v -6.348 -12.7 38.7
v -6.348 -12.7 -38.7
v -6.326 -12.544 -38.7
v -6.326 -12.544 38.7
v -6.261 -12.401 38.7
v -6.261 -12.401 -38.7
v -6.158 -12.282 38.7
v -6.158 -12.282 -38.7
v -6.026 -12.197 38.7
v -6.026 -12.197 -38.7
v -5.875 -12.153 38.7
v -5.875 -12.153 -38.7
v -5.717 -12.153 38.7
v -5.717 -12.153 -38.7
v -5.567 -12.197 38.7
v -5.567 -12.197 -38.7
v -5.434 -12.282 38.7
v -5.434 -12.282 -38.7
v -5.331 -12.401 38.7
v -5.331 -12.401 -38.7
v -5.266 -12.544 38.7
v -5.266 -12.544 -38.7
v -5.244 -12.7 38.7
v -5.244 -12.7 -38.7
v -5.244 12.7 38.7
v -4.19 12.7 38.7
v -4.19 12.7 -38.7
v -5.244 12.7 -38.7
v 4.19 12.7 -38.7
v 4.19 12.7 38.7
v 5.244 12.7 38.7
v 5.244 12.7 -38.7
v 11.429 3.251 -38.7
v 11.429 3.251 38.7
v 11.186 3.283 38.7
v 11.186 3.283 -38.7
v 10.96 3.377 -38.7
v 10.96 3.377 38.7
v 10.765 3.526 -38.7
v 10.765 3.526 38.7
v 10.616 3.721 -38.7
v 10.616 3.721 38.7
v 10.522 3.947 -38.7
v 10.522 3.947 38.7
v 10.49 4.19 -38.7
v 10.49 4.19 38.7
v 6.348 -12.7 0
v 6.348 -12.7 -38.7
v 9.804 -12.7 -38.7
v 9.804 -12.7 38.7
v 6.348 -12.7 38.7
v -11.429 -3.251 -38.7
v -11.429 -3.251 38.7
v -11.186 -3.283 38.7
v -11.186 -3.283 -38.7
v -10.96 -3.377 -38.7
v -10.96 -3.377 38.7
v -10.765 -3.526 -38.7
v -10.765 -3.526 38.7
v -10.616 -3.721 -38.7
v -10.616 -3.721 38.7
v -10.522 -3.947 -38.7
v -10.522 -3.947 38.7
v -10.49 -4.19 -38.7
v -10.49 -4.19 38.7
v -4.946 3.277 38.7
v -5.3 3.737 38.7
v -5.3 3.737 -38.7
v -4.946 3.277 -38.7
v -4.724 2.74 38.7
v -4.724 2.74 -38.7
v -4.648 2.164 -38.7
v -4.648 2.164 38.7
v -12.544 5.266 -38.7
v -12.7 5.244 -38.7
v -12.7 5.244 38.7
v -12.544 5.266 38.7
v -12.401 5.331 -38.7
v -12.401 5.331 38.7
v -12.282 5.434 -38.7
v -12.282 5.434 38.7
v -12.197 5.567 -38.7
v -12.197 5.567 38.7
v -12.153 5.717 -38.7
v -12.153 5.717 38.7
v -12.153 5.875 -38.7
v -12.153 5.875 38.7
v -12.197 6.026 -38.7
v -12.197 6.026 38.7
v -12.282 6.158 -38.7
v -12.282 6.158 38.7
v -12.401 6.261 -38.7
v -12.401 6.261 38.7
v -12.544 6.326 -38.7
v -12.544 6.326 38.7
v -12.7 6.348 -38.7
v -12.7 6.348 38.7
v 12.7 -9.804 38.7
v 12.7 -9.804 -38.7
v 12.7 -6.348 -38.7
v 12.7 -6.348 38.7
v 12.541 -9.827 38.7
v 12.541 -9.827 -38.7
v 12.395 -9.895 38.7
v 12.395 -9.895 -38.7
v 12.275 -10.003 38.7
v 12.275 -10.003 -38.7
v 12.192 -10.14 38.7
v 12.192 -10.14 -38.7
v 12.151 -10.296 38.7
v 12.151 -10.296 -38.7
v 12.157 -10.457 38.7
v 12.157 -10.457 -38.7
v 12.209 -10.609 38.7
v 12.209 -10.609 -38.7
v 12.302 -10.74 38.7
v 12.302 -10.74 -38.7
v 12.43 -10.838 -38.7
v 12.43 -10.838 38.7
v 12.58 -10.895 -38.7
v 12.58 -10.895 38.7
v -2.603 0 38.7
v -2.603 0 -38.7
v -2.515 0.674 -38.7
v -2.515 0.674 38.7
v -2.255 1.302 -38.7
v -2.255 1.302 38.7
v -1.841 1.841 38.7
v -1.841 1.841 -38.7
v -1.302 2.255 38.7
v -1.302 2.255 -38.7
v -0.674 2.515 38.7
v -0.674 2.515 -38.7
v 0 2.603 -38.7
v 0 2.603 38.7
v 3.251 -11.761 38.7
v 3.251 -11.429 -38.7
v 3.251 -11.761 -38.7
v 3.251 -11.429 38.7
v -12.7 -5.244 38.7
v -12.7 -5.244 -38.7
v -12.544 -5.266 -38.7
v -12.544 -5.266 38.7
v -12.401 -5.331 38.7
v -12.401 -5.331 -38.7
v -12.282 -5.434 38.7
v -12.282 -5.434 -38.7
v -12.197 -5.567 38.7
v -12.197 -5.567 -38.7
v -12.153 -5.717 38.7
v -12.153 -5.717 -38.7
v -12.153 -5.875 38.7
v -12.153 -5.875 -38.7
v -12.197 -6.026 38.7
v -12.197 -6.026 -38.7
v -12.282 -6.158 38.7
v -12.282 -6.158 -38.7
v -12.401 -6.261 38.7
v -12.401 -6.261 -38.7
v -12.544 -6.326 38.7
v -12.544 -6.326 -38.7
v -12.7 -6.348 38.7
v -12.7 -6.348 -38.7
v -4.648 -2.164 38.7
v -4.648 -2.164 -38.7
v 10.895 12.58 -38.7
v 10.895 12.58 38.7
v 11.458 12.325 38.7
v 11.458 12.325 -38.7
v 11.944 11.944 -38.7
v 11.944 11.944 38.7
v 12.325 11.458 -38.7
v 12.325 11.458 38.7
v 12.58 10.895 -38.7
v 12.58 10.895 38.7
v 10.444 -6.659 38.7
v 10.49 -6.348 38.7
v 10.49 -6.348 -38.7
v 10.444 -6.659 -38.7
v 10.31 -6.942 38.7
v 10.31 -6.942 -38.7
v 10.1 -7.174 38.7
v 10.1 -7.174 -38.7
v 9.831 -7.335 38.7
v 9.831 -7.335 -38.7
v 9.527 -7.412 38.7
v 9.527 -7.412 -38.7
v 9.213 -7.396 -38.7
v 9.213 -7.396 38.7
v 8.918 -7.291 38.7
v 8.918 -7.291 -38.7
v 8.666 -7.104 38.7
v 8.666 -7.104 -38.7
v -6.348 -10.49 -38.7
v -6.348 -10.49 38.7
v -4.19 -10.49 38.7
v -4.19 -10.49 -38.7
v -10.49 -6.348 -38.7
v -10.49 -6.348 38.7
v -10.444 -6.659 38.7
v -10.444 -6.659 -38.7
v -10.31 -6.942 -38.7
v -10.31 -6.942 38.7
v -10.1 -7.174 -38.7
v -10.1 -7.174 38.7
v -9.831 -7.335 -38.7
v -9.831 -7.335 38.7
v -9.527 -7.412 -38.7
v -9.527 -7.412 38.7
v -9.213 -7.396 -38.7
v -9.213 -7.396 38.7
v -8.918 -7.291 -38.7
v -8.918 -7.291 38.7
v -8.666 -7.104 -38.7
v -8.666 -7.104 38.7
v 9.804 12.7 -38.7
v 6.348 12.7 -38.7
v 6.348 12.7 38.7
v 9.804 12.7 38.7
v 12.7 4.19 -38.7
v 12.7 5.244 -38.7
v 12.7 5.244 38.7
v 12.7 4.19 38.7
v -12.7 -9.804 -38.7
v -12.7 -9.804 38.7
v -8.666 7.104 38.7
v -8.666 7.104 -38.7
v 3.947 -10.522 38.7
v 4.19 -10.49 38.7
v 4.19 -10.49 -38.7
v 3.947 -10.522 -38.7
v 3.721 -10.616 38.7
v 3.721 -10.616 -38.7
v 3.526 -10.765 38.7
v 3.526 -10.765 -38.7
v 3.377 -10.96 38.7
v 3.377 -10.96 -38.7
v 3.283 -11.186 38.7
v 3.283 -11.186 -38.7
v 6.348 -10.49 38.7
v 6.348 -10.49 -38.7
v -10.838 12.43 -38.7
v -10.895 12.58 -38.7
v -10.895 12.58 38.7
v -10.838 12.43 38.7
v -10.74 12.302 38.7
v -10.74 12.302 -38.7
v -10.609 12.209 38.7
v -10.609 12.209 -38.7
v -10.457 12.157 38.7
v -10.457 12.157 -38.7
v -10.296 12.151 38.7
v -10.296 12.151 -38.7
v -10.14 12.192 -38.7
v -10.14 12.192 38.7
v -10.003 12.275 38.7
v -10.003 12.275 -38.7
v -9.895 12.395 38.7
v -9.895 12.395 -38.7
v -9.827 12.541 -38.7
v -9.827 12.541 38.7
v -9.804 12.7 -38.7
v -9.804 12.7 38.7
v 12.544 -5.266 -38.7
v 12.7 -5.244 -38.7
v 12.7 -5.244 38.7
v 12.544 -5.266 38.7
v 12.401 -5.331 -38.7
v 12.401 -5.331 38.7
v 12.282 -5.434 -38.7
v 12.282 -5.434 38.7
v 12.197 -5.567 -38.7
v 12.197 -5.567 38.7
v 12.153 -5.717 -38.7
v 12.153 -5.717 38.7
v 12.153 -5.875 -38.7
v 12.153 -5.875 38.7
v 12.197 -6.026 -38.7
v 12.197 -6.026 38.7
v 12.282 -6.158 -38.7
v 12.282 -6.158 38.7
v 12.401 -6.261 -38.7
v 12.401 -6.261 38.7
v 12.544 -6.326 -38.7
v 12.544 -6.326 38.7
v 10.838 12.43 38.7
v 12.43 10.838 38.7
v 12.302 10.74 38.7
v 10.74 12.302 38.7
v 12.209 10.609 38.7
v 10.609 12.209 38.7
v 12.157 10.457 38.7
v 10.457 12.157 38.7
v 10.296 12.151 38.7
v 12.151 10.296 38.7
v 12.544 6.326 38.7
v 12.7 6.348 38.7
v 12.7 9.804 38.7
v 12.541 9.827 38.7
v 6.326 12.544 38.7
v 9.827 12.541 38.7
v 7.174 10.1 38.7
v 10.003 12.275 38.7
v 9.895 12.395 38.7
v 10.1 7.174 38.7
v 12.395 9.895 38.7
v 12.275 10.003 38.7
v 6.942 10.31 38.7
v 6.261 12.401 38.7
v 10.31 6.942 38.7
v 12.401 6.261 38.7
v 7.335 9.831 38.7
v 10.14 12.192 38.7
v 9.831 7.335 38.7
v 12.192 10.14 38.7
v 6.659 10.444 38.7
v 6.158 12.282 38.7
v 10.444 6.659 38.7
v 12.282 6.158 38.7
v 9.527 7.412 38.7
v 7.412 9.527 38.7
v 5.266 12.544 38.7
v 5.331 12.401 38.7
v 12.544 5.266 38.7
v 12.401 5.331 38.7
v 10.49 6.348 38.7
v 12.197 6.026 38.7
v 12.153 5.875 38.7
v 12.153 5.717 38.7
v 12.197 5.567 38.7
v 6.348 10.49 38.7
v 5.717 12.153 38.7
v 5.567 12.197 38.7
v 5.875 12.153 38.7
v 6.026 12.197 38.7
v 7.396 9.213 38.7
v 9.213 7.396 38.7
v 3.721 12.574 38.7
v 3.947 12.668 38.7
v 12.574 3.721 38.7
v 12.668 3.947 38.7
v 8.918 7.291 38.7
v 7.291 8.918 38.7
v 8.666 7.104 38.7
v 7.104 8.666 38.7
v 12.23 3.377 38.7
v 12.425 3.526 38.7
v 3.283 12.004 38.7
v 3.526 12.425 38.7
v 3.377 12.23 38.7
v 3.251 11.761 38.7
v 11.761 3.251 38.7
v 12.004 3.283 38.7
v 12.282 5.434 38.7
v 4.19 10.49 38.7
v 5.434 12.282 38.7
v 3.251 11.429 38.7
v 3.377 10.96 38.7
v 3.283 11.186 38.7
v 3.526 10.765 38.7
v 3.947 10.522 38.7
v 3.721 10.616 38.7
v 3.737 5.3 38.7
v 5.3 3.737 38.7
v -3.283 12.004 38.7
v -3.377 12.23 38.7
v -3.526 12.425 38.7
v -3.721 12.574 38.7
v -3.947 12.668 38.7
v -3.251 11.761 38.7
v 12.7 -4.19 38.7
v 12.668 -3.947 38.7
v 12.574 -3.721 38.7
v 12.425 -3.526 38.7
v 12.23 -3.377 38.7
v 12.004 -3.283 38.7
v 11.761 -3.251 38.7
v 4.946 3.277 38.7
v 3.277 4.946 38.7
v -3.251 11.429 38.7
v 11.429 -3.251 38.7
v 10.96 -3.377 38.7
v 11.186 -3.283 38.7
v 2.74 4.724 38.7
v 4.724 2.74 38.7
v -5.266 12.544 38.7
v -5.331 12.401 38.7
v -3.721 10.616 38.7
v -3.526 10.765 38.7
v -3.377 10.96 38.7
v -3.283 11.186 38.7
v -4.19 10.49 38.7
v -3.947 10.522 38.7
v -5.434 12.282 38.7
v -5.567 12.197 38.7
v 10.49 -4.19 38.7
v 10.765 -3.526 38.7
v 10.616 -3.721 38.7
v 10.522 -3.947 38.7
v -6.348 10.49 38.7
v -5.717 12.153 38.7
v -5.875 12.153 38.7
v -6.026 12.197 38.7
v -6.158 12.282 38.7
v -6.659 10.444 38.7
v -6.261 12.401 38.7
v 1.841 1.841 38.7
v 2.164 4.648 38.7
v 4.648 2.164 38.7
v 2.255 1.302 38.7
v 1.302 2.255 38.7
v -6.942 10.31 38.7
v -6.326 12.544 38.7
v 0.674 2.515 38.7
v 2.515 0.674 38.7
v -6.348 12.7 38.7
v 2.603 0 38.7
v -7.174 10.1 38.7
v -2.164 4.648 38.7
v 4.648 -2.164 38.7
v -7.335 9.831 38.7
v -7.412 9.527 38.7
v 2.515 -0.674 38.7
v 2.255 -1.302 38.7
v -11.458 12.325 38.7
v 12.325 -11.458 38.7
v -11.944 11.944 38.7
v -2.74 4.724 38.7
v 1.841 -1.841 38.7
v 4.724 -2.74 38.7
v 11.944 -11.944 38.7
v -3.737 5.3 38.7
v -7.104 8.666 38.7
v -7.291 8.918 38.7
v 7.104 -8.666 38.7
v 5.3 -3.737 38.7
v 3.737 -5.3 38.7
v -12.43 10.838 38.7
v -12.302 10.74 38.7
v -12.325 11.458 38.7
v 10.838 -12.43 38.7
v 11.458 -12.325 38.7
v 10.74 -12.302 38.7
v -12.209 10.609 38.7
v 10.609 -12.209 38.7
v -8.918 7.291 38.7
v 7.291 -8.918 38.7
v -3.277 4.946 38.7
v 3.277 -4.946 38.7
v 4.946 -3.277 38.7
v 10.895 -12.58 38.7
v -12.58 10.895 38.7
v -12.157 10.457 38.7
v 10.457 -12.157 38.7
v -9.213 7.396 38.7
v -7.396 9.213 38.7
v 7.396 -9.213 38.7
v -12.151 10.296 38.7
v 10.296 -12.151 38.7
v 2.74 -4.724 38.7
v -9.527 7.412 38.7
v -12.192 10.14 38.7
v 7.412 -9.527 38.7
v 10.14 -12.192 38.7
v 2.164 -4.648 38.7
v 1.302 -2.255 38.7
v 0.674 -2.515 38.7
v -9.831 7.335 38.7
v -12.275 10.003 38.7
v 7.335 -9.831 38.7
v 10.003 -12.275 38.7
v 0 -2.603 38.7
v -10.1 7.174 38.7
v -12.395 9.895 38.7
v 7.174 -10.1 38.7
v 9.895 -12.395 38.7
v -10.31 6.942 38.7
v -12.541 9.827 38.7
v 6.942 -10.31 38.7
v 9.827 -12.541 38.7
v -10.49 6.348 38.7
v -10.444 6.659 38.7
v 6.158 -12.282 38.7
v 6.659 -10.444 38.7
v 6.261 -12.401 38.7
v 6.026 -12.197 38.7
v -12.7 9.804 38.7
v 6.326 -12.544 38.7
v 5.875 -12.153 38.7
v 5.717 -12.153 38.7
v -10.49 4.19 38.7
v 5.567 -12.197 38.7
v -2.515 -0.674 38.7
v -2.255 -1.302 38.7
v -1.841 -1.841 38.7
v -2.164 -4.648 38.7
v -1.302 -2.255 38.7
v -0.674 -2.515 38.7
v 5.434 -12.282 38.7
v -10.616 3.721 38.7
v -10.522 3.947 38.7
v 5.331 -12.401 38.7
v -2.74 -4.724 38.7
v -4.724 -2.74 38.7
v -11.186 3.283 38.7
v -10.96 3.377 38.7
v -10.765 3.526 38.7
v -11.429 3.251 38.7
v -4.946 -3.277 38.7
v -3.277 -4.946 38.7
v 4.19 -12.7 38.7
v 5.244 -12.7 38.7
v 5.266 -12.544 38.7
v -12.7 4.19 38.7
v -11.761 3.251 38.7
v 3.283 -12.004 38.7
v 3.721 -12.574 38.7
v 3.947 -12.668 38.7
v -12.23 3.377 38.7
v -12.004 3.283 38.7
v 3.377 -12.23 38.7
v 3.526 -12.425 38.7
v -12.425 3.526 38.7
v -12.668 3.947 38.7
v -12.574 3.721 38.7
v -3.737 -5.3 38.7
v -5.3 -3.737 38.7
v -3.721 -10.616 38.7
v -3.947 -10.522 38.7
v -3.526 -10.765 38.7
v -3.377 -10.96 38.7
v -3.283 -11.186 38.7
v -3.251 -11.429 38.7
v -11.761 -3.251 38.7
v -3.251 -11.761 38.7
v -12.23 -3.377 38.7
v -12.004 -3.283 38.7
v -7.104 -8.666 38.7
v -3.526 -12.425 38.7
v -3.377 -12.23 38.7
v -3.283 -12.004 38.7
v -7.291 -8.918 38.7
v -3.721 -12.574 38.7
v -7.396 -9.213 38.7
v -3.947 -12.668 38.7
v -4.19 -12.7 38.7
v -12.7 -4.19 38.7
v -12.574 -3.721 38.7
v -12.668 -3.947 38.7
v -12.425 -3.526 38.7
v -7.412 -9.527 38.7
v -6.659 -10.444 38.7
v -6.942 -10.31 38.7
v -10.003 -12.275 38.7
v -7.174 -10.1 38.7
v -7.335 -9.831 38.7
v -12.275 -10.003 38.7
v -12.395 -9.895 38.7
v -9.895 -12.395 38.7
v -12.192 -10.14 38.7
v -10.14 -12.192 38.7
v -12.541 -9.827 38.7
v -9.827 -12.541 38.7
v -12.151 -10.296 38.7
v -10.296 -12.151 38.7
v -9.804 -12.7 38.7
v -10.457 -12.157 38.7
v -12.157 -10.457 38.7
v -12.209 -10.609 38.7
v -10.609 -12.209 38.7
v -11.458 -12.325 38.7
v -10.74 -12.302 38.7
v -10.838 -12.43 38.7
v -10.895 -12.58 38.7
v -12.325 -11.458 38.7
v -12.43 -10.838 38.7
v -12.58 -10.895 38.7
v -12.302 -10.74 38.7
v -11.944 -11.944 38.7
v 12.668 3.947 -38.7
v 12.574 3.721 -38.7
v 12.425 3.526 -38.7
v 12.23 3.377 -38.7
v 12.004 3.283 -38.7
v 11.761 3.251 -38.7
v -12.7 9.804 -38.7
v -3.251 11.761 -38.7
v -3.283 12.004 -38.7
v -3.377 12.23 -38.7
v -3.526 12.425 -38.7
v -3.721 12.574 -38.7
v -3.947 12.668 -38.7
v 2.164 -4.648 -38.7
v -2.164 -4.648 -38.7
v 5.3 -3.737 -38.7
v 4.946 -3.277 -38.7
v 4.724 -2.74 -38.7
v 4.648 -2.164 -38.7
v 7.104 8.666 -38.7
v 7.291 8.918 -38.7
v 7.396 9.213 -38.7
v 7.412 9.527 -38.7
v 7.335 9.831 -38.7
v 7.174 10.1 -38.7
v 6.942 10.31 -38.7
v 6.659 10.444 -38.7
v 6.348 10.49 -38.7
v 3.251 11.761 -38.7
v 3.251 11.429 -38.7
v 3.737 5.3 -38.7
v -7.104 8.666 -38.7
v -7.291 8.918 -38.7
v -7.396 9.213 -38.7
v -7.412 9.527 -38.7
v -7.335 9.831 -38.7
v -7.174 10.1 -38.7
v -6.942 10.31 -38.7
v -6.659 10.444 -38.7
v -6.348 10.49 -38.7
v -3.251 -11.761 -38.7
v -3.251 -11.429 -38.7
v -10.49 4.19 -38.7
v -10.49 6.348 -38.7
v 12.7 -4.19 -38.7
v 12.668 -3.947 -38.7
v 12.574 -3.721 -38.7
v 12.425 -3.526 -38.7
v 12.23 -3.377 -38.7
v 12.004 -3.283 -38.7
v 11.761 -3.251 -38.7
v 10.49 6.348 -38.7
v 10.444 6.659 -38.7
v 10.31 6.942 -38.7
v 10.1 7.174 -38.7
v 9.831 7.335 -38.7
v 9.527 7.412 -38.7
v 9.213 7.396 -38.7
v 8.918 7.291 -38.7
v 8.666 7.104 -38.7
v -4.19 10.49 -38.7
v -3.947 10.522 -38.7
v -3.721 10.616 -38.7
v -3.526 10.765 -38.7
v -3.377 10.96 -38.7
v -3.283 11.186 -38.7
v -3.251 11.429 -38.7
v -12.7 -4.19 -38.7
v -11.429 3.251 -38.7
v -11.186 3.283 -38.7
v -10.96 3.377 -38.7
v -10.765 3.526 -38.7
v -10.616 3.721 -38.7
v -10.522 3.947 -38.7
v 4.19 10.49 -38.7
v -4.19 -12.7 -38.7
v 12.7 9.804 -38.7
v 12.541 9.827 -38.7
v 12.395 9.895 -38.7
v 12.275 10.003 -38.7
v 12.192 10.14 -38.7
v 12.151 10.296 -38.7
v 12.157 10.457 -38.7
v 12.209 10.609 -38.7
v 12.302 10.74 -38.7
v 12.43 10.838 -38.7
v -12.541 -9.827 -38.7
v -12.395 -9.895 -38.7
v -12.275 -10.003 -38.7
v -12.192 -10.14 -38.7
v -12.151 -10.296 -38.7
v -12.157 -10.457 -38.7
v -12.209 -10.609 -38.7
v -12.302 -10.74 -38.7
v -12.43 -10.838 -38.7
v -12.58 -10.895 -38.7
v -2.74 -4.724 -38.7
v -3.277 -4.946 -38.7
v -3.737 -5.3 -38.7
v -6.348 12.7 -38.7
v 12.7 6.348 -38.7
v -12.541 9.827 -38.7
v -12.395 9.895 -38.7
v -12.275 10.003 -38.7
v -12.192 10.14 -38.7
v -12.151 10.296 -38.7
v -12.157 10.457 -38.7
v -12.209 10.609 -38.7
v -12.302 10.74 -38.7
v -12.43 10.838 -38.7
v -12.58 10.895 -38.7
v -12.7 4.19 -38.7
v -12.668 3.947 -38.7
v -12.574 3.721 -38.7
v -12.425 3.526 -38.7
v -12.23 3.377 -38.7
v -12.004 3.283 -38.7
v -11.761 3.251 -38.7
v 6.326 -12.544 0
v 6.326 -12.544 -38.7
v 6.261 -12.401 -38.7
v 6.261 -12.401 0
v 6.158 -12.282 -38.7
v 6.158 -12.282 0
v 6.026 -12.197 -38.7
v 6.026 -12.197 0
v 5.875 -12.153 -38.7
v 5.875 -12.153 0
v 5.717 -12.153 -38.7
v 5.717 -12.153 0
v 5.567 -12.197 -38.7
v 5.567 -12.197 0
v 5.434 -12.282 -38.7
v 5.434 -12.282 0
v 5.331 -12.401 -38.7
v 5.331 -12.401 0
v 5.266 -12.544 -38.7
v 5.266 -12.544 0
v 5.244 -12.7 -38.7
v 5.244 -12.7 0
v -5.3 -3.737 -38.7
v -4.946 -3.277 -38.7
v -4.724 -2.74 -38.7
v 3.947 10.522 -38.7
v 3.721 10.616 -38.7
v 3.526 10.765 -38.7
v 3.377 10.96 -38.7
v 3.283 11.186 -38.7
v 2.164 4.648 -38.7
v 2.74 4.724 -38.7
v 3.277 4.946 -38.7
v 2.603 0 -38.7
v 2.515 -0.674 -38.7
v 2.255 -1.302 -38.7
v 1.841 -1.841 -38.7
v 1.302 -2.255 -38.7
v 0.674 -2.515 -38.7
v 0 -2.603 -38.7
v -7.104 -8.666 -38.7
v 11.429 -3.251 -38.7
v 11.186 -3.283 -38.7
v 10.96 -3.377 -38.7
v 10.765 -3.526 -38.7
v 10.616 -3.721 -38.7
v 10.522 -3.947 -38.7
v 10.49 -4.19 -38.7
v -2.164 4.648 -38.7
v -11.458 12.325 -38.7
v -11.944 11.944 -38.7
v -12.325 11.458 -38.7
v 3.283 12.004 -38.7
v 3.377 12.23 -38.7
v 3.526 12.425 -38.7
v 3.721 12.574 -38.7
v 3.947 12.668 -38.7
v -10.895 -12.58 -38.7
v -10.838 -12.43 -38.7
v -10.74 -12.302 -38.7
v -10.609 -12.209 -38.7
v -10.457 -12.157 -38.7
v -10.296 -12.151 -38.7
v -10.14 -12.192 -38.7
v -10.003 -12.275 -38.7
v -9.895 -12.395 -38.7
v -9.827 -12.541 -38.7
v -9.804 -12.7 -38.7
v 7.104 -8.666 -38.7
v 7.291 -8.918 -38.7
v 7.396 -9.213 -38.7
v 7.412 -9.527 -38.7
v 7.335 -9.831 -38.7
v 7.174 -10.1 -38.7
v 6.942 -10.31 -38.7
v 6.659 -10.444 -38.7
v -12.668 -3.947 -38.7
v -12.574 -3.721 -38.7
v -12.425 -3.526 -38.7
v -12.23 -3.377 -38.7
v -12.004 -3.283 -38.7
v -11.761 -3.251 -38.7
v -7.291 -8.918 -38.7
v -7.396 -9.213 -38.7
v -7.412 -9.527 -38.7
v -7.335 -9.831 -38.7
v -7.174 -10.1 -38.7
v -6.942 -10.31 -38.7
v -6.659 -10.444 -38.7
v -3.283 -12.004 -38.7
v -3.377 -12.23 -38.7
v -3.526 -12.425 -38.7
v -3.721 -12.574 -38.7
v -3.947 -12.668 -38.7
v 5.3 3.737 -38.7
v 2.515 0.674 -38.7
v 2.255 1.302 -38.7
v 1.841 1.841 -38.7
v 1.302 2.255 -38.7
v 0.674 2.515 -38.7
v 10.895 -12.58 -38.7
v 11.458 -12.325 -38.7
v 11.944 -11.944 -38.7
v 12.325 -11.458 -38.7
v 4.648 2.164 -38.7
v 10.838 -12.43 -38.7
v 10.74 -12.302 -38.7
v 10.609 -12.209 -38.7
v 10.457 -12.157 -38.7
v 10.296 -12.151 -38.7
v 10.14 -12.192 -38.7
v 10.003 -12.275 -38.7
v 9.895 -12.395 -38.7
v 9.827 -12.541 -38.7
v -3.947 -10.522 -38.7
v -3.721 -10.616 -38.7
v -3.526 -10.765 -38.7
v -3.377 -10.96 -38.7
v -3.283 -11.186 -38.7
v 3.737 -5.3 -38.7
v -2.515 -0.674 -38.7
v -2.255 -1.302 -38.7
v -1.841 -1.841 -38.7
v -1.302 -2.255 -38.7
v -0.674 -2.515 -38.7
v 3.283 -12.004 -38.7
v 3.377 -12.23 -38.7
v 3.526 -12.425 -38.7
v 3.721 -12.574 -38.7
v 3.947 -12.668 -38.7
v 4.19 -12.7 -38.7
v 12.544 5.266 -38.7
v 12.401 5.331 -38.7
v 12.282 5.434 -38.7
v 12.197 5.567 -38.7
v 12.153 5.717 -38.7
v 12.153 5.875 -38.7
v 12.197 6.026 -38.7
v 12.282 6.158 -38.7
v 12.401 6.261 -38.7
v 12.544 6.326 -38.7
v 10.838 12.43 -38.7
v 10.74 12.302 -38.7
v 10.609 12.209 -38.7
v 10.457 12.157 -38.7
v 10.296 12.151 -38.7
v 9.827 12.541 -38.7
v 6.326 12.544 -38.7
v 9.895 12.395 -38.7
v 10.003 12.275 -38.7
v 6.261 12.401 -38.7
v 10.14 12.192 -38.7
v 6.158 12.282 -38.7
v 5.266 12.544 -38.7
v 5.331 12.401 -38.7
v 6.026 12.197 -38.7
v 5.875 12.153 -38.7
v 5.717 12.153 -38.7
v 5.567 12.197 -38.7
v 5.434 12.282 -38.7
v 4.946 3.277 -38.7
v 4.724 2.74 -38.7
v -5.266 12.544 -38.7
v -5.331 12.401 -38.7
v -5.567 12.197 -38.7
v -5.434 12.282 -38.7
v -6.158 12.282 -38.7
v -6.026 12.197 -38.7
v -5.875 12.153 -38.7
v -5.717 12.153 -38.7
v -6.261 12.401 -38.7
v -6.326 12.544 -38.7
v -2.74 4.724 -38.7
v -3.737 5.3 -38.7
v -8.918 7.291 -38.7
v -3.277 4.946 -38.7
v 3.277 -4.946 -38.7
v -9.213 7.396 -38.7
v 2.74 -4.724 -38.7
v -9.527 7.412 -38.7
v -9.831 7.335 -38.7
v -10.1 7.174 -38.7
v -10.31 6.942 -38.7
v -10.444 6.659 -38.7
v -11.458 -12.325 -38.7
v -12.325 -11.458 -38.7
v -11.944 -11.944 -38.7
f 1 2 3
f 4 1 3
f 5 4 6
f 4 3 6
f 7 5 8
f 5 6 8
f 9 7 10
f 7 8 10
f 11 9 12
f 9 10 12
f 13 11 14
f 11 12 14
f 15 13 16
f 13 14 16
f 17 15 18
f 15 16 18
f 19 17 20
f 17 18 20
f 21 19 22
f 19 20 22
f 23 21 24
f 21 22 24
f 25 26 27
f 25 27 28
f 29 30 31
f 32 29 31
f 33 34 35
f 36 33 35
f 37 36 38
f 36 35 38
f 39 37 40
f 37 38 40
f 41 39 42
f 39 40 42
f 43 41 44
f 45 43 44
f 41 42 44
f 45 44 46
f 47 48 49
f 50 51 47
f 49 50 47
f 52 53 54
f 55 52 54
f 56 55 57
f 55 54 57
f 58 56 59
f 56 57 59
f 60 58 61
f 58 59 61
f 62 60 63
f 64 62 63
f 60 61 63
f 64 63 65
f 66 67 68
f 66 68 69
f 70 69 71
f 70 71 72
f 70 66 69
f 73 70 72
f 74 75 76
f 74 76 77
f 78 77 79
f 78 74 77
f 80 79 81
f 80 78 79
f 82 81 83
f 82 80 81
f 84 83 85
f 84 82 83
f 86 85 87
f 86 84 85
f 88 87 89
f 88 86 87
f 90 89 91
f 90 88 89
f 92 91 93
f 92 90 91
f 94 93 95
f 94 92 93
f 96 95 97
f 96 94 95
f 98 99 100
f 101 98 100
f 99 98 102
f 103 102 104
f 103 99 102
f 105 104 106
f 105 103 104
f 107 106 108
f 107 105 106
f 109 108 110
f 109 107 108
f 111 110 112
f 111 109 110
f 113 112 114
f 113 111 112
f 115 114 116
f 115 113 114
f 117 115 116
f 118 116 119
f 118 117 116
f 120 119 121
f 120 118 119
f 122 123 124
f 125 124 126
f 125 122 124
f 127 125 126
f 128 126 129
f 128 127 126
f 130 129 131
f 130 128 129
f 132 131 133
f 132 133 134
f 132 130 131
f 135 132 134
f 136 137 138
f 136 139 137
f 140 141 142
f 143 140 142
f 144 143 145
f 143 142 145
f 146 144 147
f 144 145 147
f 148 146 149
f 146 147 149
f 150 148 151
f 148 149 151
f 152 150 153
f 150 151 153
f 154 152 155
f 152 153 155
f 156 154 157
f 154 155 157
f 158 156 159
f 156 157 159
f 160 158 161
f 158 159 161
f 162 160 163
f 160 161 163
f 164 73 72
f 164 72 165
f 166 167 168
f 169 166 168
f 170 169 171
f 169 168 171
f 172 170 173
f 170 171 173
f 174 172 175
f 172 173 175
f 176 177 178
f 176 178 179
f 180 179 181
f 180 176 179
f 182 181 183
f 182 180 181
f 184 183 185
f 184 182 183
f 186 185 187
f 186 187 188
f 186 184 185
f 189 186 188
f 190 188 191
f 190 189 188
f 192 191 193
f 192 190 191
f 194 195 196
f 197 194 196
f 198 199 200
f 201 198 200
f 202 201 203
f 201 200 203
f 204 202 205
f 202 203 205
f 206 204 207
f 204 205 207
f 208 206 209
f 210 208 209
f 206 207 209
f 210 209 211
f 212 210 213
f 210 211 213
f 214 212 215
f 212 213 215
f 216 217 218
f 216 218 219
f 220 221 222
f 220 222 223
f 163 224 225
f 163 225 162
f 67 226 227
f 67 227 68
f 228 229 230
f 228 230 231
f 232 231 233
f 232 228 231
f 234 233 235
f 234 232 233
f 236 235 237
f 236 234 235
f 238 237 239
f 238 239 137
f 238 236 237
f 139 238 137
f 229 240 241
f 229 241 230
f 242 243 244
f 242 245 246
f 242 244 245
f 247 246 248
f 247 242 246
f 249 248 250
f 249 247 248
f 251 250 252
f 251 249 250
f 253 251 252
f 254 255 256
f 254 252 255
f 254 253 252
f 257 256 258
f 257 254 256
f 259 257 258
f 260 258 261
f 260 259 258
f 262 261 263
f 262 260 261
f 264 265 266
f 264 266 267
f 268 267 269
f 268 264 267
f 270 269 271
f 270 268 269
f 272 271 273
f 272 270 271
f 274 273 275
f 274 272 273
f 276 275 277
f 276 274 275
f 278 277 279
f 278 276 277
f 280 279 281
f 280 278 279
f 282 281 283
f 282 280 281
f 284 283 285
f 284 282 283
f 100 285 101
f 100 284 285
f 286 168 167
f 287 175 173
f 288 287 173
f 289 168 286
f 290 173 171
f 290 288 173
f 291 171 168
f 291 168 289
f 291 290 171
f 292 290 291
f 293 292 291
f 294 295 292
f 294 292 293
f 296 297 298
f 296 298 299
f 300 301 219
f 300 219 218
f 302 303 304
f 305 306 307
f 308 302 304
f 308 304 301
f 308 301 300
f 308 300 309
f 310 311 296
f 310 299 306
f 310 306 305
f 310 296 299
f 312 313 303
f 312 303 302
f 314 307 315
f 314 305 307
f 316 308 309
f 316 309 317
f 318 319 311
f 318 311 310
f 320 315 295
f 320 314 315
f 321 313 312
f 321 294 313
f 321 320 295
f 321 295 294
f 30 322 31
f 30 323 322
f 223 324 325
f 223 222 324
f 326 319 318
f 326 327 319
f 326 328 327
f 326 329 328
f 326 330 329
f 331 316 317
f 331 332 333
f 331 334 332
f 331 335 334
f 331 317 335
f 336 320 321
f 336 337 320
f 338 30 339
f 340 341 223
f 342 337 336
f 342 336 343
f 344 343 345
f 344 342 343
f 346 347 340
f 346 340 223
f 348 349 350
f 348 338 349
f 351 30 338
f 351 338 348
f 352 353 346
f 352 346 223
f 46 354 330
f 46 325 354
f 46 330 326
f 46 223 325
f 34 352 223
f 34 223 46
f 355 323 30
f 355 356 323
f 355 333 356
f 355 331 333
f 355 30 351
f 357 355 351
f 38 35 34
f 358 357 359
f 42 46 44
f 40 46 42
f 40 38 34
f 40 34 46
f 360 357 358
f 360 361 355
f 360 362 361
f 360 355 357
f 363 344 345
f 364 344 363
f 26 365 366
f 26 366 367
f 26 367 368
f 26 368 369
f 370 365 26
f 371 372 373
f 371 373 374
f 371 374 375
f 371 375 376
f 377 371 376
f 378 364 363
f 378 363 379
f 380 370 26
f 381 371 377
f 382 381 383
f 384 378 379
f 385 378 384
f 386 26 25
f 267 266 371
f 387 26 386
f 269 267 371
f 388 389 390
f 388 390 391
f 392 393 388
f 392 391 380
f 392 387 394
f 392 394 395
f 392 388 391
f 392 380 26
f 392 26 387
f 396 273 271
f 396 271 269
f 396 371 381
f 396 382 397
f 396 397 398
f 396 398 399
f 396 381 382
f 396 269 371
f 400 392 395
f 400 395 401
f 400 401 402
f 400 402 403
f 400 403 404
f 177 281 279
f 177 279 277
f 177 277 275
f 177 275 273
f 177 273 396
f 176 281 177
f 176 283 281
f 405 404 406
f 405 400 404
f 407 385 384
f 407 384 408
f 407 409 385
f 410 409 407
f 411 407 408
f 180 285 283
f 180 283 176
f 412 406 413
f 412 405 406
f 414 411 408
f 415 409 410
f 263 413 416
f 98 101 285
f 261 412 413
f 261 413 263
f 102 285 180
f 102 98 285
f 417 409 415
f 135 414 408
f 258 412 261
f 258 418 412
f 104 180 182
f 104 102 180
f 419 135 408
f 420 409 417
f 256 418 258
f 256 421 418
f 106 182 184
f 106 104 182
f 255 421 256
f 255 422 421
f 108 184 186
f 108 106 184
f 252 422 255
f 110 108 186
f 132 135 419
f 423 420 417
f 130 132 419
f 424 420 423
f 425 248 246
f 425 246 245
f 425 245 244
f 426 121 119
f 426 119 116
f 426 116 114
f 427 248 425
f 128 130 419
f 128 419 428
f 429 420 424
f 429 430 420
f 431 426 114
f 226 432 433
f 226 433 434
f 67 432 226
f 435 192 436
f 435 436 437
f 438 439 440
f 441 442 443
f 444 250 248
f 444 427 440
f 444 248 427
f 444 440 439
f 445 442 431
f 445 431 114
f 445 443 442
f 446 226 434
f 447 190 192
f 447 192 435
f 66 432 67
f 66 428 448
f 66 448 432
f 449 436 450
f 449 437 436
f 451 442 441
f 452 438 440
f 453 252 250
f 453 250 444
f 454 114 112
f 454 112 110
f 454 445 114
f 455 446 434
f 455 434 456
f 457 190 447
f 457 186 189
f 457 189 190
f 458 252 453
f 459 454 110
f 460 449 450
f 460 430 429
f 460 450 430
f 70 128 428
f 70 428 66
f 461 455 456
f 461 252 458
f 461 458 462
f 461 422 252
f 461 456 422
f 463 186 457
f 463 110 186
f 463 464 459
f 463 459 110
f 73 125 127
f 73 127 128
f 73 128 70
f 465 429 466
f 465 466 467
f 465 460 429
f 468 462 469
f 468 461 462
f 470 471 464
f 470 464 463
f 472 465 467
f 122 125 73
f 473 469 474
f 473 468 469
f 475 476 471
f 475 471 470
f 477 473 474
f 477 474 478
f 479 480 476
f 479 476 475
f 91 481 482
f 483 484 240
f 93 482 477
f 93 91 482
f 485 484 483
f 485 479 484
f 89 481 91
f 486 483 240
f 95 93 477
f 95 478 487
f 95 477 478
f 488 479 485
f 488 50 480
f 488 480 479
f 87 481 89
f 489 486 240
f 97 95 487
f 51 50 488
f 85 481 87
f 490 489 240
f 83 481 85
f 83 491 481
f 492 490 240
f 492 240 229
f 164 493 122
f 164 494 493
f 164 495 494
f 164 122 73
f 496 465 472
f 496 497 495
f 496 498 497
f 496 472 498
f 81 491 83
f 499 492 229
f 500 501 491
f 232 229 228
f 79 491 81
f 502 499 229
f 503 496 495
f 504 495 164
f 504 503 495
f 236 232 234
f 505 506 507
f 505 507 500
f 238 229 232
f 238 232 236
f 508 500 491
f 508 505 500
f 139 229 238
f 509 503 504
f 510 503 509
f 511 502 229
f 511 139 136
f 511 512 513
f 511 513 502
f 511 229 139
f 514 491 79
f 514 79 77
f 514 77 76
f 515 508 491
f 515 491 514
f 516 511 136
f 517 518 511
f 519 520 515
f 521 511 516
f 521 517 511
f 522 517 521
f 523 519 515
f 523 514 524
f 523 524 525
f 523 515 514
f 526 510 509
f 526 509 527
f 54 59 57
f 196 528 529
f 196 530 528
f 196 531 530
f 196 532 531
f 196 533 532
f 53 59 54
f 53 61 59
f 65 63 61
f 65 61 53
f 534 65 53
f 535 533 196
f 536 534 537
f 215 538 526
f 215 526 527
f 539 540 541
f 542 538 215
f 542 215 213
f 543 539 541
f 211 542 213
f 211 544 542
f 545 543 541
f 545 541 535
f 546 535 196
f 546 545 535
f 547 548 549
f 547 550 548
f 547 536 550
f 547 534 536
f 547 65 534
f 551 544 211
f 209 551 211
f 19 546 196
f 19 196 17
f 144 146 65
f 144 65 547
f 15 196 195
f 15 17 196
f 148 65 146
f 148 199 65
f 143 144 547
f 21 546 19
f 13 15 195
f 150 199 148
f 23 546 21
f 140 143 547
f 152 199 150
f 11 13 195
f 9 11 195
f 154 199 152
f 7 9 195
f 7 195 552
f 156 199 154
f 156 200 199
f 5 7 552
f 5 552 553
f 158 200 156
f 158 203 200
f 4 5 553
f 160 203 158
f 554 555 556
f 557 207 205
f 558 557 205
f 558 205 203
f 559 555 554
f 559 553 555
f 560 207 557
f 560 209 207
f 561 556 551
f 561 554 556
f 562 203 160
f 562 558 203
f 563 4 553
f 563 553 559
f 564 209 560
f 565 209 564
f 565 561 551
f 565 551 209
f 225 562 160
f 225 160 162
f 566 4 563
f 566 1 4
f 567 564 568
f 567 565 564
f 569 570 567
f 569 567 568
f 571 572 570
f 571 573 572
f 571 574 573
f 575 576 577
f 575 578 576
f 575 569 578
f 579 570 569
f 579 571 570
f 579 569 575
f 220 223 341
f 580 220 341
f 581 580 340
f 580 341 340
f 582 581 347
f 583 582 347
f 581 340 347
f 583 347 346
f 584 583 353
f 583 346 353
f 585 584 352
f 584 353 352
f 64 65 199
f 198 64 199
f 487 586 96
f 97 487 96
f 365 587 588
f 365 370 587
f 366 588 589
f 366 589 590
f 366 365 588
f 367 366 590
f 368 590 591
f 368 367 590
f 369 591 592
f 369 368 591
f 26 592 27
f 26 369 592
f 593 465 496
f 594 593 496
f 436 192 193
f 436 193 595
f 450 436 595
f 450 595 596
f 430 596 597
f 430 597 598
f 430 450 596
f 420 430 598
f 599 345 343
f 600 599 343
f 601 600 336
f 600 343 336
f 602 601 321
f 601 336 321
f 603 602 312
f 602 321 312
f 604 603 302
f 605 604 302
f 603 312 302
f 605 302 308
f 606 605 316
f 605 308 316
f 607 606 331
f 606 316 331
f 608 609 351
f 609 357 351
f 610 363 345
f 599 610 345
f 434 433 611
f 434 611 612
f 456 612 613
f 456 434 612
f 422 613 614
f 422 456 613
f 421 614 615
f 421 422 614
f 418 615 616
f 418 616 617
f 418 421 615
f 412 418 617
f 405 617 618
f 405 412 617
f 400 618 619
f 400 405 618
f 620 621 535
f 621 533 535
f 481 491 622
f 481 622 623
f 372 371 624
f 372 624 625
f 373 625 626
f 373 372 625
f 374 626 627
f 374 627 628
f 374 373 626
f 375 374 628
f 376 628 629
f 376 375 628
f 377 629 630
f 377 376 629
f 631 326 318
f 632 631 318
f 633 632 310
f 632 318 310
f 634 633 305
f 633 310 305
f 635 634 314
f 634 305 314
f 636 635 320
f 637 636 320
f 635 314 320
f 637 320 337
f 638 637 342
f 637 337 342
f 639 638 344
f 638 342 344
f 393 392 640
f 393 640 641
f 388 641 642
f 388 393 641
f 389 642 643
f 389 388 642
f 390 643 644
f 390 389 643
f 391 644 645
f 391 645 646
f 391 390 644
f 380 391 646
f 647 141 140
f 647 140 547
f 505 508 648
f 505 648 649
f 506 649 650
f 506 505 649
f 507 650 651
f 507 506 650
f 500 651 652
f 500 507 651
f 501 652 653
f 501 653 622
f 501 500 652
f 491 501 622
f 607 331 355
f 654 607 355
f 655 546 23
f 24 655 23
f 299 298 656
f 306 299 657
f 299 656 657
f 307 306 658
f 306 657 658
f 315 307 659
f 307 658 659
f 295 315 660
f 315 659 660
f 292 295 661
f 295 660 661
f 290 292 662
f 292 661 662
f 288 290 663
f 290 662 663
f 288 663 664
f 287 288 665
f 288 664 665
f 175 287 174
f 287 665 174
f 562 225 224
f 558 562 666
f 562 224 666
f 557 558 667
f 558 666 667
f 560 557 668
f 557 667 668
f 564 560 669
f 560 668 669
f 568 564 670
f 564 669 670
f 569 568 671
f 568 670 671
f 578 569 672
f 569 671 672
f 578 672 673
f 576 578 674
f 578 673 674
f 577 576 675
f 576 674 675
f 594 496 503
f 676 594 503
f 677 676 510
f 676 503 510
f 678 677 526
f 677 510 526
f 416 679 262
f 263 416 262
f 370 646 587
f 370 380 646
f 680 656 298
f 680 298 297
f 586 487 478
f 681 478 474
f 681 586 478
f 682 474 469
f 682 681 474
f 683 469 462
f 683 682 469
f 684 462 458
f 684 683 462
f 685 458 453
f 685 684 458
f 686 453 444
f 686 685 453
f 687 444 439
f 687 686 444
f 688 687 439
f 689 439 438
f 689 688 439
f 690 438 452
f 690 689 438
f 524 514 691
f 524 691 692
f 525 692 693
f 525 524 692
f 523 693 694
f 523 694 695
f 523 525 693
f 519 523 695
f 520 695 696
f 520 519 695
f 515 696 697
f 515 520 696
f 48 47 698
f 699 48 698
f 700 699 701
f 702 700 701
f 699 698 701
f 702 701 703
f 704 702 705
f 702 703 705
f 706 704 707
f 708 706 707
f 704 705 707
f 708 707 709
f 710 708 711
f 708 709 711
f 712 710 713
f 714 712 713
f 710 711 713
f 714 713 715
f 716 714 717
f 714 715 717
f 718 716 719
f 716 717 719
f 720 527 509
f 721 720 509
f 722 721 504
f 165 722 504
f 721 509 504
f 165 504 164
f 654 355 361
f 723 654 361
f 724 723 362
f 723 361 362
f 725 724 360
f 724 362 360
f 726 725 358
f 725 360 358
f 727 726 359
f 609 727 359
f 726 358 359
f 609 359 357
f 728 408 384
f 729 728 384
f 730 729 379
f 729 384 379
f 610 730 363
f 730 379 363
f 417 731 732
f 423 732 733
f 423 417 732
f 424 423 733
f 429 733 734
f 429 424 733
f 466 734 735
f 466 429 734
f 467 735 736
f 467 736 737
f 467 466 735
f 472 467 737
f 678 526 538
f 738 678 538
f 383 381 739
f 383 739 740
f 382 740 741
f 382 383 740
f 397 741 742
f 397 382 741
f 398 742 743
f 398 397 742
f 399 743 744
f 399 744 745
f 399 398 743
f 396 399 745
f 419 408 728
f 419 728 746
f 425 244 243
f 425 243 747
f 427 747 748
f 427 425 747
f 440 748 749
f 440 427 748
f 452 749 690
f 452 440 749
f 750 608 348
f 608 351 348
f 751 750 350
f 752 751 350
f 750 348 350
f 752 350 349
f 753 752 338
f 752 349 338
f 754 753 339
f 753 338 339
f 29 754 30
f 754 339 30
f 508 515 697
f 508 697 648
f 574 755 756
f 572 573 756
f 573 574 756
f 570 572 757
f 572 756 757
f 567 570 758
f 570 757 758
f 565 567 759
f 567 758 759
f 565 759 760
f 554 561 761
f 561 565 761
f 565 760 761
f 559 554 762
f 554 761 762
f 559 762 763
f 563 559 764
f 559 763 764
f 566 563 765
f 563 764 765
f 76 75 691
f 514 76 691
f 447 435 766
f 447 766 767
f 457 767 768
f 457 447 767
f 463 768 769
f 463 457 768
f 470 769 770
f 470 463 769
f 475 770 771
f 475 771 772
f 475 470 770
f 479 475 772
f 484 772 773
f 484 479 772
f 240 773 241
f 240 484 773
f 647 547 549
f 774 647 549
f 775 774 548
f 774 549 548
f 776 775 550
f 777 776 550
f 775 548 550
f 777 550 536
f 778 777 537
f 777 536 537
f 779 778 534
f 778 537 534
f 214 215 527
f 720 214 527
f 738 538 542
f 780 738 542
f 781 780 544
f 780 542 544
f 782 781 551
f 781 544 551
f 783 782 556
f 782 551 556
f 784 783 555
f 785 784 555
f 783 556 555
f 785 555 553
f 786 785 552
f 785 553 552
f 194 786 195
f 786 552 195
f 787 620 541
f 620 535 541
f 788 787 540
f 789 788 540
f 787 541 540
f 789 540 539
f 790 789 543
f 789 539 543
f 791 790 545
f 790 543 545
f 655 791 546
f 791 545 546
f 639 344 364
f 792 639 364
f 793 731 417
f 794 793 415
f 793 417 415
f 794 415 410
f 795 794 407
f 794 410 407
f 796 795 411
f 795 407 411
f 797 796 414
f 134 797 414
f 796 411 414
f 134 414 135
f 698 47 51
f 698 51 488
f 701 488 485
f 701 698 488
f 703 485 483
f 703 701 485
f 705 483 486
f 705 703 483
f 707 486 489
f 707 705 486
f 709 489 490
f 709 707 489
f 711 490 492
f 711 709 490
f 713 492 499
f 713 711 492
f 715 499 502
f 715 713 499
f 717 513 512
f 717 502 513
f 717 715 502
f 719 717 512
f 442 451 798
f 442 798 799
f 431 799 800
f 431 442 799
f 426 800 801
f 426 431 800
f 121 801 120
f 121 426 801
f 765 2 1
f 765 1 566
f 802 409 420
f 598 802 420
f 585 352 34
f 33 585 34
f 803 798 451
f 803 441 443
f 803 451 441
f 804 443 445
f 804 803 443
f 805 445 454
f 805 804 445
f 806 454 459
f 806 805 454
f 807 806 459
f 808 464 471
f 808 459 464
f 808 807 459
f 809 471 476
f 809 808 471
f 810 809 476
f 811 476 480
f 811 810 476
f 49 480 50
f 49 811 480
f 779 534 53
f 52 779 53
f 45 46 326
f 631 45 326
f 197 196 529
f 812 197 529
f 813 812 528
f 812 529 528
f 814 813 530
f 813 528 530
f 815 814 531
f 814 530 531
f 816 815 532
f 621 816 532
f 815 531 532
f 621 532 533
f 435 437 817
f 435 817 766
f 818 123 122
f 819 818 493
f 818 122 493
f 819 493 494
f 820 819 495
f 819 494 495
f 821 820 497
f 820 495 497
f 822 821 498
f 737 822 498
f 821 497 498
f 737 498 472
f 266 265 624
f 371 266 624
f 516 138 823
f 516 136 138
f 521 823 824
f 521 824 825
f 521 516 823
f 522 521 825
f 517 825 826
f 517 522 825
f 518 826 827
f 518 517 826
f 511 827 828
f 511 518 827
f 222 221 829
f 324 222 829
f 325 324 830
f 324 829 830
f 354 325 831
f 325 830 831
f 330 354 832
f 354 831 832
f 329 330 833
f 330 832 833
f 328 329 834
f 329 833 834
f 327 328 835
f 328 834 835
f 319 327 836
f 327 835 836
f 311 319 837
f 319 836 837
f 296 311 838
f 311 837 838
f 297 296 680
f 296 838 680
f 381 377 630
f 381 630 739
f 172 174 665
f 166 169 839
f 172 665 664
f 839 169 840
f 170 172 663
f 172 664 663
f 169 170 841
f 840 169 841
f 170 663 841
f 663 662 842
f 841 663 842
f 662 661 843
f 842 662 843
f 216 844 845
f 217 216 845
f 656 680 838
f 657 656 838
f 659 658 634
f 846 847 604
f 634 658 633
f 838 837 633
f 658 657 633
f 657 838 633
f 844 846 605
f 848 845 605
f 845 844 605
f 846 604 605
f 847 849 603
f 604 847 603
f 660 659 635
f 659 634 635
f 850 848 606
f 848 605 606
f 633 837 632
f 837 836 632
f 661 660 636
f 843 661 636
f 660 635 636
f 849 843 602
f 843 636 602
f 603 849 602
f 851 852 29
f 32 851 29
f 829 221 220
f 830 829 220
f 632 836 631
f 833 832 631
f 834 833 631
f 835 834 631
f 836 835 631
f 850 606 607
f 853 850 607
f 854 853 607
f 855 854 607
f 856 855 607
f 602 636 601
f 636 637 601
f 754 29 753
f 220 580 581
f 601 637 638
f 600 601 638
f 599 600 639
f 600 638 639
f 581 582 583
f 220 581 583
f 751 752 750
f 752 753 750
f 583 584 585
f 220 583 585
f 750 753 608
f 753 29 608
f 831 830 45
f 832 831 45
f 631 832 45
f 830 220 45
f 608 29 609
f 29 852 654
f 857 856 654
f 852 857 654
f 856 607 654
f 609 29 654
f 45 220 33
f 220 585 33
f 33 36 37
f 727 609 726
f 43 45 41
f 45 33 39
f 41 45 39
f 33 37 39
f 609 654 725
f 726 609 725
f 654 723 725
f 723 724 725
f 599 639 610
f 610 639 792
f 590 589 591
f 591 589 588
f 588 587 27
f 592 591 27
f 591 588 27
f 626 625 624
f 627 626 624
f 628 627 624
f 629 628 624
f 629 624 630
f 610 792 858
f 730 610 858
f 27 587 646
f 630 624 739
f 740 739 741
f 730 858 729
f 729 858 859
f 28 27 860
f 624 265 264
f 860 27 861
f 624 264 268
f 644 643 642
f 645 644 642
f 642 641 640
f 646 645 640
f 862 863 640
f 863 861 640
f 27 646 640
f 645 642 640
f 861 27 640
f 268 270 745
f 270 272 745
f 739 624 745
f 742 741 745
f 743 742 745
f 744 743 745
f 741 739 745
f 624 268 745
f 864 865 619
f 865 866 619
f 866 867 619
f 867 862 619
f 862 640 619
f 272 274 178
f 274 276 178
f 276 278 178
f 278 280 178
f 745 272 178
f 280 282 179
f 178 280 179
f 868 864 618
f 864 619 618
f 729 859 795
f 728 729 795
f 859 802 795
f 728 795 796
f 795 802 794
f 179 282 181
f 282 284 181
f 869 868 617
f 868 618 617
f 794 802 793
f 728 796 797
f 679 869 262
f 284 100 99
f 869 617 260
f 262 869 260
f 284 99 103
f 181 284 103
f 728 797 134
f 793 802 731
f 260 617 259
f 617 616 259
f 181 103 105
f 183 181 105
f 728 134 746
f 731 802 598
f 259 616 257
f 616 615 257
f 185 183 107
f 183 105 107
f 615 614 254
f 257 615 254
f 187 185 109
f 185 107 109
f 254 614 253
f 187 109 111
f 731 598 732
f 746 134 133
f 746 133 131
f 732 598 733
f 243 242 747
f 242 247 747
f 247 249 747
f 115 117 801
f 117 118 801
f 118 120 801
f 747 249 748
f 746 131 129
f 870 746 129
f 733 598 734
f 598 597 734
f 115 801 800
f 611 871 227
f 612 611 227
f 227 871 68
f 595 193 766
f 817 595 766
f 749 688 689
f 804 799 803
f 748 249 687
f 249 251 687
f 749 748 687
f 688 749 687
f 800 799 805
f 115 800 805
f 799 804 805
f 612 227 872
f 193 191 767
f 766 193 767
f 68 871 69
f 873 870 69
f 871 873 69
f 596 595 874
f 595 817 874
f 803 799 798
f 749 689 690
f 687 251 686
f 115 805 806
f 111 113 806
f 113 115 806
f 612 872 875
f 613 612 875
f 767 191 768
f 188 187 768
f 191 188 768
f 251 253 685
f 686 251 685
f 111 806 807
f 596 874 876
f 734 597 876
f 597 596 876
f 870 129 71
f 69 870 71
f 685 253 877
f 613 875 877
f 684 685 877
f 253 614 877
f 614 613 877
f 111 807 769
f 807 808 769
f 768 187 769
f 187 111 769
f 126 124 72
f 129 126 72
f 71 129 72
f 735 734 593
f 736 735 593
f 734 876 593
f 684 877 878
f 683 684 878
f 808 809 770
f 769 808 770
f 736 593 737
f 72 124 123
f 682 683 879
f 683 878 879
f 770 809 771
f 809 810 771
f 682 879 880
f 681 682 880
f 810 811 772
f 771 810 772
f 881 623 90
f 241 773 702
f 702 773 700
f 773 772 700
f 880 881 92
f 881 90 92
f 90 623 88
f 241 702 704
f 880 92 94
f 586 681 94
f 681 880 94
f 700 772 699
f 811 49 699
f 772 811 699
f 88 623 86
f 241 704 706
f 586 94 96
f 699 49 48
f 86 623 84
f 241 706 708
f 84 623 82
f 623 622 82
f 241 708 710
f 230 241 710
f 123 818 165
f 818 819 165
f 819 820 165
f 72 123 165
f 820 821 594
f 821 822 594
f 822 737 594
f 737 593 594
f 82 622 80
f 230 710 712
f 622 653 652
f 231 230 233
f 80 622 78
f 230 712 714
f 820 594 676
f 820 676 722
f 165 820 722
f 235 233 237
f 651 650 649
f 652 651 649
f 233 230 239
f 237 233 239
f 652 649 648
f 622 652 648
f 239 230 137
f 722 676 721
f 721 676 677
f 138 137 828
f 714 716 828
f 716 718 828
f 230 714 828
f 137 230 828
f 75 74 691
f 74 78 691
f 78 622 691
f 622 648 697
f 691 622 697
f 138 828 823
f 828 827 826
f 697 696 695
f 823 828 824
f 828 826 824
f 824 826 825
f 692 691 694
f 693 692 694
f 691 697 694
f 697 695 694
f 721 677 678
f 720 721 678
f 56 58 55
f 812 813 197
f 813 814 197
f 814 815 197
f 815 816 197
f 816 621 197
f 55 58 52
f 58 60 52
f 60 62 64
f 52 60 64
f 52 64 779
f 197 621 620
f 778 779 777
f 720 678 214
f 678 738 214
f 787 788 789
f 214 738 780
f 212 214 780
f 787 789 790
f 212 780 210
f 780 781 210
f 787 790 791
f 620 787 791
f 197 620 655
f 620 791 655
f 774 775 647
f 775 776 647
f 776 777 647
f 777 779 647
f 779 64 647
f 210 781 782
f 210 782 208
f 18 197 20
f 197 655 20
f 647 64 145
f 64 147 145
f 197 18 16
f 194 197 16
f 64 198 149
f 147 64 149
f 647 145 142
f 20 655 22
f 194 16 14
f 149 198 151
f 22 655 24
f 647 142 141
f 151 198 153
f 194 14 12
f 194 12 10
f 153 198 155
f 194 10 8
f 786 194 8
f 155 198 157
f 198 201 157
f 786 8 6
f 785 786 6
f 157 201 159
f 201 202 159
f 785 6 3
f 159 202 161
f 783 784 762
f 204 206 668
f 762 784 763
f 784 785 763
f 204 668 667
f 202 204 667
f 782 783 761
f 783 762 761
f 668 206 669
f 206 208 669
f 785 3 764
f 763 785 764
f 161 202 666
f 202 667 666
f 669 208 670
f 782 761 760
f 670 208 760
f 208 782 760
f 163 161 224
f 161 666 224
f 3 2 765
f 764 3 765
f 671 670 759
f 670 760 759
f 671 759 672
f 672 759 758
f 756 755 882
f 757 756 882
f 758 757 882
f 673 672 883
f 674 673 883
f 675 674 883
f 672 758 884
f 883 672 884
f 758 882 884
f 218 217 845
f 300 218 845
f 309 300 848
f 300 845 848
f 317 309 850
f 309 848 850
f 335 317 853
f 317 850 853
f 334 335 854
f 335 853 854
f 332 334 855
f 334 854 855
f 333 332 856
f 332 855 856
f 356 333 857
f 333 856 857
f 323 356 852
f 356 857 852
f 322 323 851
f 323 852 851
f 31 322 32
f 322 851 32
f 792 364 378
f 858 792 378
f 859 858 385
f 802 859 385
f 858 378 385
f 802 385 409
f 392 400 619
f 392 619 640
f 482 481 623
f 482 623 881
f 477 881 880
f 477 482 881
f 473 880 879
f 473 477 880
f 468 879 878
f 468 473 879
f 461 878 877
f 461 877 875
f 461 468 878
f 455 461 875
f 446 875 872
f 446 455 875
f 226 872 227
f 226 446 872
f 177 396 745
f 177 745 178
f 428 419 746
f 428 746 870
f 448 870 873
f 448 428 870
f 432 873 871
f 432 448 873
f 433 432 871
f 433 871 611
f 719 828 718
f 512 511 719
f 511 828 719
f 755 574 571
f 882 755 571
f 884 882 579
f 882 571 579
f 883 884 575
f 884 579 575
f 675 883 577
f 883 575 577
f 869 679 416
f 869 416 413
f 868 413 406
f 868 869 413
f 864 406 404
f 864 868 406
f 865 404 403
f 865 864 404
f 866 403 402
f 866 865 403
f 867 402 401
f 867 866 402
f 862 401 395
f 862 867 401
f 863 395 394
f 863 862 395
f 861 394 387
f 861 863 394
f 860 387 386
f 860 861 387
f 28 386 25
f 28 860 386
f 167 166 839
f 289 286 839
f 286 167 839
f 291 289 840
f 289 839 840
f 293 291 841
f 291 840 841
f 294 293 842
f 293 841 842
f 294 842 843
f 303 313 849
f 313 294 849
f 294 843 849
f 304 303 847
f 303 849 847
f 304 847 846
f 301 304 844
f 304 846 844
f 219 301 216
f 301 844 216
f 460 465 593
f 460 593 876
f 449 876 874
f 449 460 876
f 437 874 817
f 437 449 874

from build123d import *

# Parameters (mm, degrees)
BOSS_EXTRUDE1_DEPTH     = 38.7
SKETCH5_R               = 0.55245
CUT_EXTRUDE1_DEPTH      = 39.7
CUT_EXTRUDE1_DEPTH_BACK = 39.7


with BuildPart() as part:
    # Sketch4 → Boss-Extrude1 (new body, symmetric)
    with BuildSketch(Plane.XY):
        with BuildLine():
            Line((4.190365, -12.7), (10.11729625, -12.7))
            ThreePointArc((10.11729625, -12.7), (11.943543585, -11.943543585), (12.7, -10.11729625))
            Line((12.7, -10.11729625), (12.7, -4.190365))
            ThreePointArc((12.7, -4.190365), (12.42492494, -3.52627506), (11.760835, -3.2512))
            Line((11.760835, -3.2512), (11.429365, -3.2512))
            ThreePointArc((11.429365, -3.2512), (10.76527506, -3.52627506), (10.4902, -4.190365))
            Line((10.4902, -4.190365), (10.4902, -6.348478019))
            ThreePointArc((10.4902, -6.348478019), (9.830707141, -7.335478831), (8.666460301, -7.103895736))
            Line((8.666460301, -7.103895736), (5.299899128, -3.737334563))
            ThreePointArc((5.299899128, -3.737334563), (4.817571085, -3.015479634), (4.6482, -2.16399369))
            Line((4.6482, -2.16399369), (4.6482, 0))
            Line((4.6482, 0), (2.6035, 0))
            ThreePointArc((2.6035, 0), (1.840952505, -1.840952505), (0, -2.6035))
            Line((0, -2.6035), (0, -4.6482))
            Line((0, -4.6482), (2.16399369, -4.6482))
            ThreePointArc((2.16399369, -4.6482), (3.015479634, -4.817571085), (3.737334563, -5.299899128))
            Line((3.737334563, -5.299899128), (7.103895736, -8.666460301))
            ThreePointArc((7.103895736, -8.666460301), (7.335478831, -9.830707141), (6.348478019, -10.4902))
            Line((6.348478019, -10.4902), (4.190365, -10.4902))
            ThreePointArc((4.190365, -10.4902), (3.52627506, -10.76527506), (3.2512, -11.429365))
            Line((3.2512, -11.429365), (3.2512, -11.760835))
            ThreePointArc((3.2512, -11.760835), (3.52627506, -12.42492494), (4.190365, -12.7))
        make_face()
    extrude(amount=BOSS_EXTRUDE1_DEPTH, both=True)

    # Sketch5 → Cut-Extrude1 (cut, two sides)
    with BuildSketch(Plane.XY) as cut_extrude1_sk:
        with Locations((10.356153152, -12.7)):
            Circle(SKETCH5_R)
        with Locations((5.796028019, -12.7)):
            Circle(SKETCH5_R)
        with Locations((12.7, -10.356153152)):
            Circle(SKETCH5_R)
        with Locations((12.7, -5.796028019)):
            Circle(SKETCH5_R)
    extrude(amount=CUT_EXTRUDE1_DEPTH, mode=Mode.SUBTRACT)
    extrude(cut_extrude1_sk.sketch, amount=-CUT_EXTRUDE1_DEPTH_BACK, mode=Mode.SUBTRACT)

    # Mirror1: part across plane


with BuildPart() as part_1:
    add(part.part)
    add(part.part.mirror(Plane(origin=(0, 0, 0), x_dir=(0, 0, 1), z_dir=(1, 0, 0))))

    # Mirror2: part across plane


with BuildPart() as part_2:
    add(part_1.part)
    add(part_1.part.mirror(Plane.ZX))


solid = part_2.part
